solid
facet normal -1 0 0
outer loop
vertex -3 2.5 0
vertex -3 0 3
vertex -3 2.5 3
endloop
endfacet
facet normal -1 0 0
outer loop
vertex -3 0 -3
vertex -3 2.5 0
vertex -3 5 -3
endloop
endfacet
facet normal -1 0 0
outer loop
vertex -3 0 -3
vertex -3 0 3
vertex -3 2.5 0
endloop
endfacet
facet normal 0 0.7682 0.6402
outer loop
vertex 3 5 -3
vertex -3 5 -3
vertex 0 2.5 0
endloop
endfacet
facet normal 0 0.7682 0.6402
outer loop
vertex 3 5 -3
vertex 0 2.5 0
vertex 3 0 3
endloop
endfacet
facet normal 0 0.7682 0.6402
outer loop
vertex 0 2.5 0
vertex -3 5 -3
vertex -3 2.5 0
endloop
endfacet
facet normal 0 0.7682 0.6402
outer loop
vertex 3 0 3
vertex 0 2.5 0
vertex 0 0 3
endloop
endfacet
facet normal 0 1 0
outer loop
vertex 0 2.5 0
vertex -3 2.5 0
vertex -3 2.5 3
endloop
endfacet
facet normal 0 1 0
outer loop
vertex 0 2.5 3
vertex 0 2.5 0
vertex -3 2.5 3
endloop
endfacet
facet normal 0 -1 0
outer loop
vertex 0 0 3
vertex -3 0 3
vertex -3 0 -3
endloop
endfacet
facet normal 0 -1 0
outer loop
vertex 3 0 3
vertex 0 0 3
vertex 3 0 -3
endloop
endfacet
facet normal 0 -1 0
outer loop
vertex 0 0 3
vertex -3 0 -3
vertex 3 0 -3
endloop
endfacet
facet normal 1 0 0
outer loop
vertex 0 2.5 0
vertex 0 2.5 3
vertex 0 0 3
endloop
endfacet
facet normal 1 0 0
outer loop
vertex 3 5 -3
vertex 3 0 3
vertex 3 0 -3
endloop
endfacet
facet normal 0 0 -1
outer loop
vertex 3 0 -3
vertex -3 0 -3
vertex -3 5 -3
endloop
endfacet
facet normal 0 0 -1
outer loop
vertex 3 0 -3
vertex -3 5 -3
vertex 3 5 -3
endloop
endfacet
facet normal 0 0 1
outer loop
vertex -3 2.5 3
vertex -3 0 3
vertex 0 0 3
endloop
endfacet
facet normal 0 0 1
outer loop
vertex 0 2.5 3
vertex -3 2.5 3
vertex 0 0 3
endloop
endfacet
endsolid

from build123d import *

# Parameters (mm, degrees)
SKETCH1_W           = 6
SKETCH1_H           = 6
BOSS_EXTRUDE1_DEPTH = 5
CUT_EXTRUDE1_DEPTH  = 10
CUT_EXTRUDE2_DEPTH  = 3


with BuildPart() as part:
    # Sketch1 → Boss-Extrude1 (new body)
    with BuildSketch(Plane(origin=(0, 0, 0), x_dir=(1, 0, 0), z_dir=(0, 1, 0))):
        Rectangle(SKETCH1_W, SKETCH1_H)
    extrude(amount=BOSS_EXTRUDE1_DEPTH)

    # Sketch2 → Cut-Extrude1 (cut)
    with BuildSketch(Plane.ZY.offset(3)):
        Polygon((3, 5), (-3, 5), (0, 2.5), (3, 2.5), align=None)
    extrude(amount=-CUT_EXTRUDE1_DEPTH, mode=Mode.SUBTRACT)

    # Sketch3 → Cut-Extrude2 (cut)
    with BuildSketch(Plane(origin=(3, 0, 0), x_dir=(0, 0, -1), z_dir=(1, 0, 0))):
        Polygon((-3, 0), (0, 2.5), (-3, 2.5), align=None)
    extrude(amount=-CUT_EXTRUDE2_DEPTH, mode=Mode.SUBTRACT)


solid = part.part
